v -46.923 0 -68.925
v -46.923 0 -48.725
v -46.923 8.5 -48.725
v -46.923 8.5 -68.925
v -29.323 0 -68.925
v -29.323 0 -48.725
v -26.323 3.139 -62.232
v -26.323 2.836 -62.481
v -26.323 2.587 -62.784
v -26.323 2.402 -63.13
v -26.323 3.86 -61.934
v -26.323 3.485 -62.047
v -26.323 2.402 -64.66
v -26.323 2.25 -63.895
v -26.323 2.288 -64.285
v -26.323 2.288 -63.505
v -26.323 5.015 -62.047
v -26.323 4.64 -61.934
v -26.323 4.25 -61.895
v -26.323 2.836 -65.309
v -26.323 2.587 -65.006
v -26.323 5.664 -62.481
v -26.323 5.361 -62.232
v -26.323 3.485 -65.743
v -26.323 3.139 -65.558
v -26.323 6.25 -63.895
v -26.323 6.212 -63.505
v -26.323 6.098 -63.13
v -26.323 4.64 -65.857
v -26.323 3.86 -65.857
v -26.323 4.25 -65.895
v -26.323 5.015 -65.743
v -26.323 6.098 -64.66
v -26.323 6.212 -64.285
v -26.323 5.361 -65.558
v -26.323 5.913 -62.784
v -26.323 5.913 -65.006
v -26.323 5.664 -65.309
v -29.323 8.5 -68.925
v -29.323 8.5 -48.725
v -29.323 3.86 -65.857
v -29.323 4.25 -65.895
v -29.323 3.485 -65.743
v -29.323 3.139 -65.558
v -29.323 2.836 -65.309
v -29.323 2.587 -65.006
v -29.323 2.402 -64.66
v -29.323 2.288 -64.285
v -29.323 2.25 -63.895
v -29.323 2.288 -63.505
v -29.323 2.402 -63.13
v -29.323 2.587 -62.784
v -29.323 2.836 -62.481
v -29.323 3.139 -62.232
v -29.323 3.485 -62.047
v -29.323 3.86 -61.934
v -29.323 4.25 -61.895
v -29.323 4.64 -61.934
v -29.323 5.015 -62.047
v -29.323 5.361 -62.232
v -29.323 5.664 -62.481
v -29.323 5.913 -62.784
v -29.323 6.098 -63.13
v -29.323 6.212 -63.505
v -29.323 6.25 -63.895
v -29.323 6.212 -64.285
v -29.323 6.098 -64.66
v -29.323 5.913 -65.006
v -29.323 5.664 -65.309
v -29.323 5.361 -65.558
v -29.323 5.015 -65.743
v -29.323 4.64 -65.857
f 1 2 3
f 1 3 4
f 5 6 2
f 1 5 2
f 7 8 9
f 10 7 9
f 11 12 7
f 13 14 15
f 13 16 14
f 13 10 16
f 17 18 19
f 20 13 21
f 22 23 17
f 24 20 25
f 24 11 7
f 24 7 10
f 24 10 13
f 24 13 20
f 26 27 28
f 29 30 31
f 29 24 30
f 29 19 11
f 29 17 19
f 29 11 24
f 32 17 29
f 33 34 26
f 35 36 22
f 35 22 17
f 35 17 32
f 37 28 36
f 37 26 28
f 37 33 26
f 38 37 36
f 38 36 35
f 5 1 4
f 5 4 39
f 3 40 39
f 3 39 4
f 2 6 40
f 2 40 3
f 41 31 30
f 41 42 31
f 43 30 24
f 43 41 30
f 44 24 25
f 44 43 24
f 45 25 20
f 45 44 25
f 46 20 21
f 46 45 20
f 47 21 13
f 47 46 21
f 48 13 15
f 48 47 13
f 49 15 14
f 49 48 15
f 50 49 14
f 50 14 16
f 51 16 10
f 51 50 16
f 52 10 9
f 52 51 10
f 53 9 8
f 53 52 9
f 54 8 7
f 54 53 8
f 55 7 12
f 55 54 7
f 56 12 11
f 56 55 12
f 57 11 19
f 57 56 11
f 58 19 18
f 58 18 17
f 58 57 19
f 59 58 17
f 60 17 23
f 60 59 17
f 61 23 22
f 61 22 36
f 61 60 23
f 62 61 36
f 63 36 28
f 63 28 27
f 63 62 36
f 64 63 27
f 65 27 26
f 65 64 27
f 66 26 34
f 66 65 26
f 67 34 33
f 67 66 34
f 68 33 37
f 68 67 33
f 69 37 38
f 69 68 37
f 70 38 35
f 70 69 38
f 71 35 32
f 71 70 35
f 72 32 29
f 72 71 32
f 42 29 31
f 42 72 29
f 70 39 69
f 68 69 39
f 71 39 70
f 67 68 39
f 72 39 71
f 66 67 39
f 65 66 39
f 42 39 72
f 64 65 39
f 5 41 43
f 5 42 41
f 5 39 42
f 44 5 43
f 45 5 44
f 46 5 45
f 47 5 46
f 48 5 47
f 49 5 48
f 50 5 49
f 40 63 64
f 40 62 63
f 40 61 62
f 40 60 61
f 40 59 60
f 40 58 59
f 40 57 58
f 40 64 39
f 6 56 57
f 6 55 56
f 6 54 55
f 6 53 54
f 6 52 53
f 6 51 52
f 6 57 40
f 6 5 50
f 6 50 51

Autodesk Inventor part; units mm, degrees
ref_plane "YZ Plane" through (0, 0, 0) normal (1, 0, 0) x (0, 1, 0)
ref_plane "XZ Plane" through (0, 0, 0) normal (0, 1, 0) x (-1, 0, 0)
ref_plane "XY Plane" through (0, 0, 0) normal (0, 0, 1) x (1, 0, 0)
sketch "Sketch1" plane through (0, 0, 0) normal (0, 1, 0) x (-1, 0, 0)
  line L0 (46.923, -68.9252) -> (29.323, -68.9252)
  line L1 (29.323, -68.9252) -> (29.323, -48.7252)
  line L2 (29.323, -48.7252) -> (46.923, -48.7252)
  line L3 (46.923, -48.7252) -> (46.923, -68.9252)
  point P0 (0, 0)
  dimension "d0" = 17.6
  dimension "d1" = 20.2
extrude "Extrusion1" add sketch "Sketch1" along normal blind 8.5
sketch "Sketch2" plane through (-29.323, 0, -48.7252) normal (1, 0, 0) x (0, 0, -1)
  line L0 (0, 0) -> (20.2, 0) projected
  line L1 (20.2, 0) -> (20.2, 8.5) projected
  line L2 (0, 8.5) -> (20.2, 8.5) projected
  line L3 (0, 0) -> (0, 8.5) projected
  line L4 (20.2, 0) -> (20.2, 8.5) projected
  line L5 (20.2, 4.25) -> (0, 4.25)
  line L6 (0, 0) -> (0, 8.5) projected
  circle A0 centre (15.1699, 4.25) radius 2
  point P0 (-48.7252, 0)
  dimension "d4" = 4
extrude "Extrusion2" add sketch "Sketch2" along normal blind 3 contours A0 L5 | L5 A0
properties part number "servo_cos"
